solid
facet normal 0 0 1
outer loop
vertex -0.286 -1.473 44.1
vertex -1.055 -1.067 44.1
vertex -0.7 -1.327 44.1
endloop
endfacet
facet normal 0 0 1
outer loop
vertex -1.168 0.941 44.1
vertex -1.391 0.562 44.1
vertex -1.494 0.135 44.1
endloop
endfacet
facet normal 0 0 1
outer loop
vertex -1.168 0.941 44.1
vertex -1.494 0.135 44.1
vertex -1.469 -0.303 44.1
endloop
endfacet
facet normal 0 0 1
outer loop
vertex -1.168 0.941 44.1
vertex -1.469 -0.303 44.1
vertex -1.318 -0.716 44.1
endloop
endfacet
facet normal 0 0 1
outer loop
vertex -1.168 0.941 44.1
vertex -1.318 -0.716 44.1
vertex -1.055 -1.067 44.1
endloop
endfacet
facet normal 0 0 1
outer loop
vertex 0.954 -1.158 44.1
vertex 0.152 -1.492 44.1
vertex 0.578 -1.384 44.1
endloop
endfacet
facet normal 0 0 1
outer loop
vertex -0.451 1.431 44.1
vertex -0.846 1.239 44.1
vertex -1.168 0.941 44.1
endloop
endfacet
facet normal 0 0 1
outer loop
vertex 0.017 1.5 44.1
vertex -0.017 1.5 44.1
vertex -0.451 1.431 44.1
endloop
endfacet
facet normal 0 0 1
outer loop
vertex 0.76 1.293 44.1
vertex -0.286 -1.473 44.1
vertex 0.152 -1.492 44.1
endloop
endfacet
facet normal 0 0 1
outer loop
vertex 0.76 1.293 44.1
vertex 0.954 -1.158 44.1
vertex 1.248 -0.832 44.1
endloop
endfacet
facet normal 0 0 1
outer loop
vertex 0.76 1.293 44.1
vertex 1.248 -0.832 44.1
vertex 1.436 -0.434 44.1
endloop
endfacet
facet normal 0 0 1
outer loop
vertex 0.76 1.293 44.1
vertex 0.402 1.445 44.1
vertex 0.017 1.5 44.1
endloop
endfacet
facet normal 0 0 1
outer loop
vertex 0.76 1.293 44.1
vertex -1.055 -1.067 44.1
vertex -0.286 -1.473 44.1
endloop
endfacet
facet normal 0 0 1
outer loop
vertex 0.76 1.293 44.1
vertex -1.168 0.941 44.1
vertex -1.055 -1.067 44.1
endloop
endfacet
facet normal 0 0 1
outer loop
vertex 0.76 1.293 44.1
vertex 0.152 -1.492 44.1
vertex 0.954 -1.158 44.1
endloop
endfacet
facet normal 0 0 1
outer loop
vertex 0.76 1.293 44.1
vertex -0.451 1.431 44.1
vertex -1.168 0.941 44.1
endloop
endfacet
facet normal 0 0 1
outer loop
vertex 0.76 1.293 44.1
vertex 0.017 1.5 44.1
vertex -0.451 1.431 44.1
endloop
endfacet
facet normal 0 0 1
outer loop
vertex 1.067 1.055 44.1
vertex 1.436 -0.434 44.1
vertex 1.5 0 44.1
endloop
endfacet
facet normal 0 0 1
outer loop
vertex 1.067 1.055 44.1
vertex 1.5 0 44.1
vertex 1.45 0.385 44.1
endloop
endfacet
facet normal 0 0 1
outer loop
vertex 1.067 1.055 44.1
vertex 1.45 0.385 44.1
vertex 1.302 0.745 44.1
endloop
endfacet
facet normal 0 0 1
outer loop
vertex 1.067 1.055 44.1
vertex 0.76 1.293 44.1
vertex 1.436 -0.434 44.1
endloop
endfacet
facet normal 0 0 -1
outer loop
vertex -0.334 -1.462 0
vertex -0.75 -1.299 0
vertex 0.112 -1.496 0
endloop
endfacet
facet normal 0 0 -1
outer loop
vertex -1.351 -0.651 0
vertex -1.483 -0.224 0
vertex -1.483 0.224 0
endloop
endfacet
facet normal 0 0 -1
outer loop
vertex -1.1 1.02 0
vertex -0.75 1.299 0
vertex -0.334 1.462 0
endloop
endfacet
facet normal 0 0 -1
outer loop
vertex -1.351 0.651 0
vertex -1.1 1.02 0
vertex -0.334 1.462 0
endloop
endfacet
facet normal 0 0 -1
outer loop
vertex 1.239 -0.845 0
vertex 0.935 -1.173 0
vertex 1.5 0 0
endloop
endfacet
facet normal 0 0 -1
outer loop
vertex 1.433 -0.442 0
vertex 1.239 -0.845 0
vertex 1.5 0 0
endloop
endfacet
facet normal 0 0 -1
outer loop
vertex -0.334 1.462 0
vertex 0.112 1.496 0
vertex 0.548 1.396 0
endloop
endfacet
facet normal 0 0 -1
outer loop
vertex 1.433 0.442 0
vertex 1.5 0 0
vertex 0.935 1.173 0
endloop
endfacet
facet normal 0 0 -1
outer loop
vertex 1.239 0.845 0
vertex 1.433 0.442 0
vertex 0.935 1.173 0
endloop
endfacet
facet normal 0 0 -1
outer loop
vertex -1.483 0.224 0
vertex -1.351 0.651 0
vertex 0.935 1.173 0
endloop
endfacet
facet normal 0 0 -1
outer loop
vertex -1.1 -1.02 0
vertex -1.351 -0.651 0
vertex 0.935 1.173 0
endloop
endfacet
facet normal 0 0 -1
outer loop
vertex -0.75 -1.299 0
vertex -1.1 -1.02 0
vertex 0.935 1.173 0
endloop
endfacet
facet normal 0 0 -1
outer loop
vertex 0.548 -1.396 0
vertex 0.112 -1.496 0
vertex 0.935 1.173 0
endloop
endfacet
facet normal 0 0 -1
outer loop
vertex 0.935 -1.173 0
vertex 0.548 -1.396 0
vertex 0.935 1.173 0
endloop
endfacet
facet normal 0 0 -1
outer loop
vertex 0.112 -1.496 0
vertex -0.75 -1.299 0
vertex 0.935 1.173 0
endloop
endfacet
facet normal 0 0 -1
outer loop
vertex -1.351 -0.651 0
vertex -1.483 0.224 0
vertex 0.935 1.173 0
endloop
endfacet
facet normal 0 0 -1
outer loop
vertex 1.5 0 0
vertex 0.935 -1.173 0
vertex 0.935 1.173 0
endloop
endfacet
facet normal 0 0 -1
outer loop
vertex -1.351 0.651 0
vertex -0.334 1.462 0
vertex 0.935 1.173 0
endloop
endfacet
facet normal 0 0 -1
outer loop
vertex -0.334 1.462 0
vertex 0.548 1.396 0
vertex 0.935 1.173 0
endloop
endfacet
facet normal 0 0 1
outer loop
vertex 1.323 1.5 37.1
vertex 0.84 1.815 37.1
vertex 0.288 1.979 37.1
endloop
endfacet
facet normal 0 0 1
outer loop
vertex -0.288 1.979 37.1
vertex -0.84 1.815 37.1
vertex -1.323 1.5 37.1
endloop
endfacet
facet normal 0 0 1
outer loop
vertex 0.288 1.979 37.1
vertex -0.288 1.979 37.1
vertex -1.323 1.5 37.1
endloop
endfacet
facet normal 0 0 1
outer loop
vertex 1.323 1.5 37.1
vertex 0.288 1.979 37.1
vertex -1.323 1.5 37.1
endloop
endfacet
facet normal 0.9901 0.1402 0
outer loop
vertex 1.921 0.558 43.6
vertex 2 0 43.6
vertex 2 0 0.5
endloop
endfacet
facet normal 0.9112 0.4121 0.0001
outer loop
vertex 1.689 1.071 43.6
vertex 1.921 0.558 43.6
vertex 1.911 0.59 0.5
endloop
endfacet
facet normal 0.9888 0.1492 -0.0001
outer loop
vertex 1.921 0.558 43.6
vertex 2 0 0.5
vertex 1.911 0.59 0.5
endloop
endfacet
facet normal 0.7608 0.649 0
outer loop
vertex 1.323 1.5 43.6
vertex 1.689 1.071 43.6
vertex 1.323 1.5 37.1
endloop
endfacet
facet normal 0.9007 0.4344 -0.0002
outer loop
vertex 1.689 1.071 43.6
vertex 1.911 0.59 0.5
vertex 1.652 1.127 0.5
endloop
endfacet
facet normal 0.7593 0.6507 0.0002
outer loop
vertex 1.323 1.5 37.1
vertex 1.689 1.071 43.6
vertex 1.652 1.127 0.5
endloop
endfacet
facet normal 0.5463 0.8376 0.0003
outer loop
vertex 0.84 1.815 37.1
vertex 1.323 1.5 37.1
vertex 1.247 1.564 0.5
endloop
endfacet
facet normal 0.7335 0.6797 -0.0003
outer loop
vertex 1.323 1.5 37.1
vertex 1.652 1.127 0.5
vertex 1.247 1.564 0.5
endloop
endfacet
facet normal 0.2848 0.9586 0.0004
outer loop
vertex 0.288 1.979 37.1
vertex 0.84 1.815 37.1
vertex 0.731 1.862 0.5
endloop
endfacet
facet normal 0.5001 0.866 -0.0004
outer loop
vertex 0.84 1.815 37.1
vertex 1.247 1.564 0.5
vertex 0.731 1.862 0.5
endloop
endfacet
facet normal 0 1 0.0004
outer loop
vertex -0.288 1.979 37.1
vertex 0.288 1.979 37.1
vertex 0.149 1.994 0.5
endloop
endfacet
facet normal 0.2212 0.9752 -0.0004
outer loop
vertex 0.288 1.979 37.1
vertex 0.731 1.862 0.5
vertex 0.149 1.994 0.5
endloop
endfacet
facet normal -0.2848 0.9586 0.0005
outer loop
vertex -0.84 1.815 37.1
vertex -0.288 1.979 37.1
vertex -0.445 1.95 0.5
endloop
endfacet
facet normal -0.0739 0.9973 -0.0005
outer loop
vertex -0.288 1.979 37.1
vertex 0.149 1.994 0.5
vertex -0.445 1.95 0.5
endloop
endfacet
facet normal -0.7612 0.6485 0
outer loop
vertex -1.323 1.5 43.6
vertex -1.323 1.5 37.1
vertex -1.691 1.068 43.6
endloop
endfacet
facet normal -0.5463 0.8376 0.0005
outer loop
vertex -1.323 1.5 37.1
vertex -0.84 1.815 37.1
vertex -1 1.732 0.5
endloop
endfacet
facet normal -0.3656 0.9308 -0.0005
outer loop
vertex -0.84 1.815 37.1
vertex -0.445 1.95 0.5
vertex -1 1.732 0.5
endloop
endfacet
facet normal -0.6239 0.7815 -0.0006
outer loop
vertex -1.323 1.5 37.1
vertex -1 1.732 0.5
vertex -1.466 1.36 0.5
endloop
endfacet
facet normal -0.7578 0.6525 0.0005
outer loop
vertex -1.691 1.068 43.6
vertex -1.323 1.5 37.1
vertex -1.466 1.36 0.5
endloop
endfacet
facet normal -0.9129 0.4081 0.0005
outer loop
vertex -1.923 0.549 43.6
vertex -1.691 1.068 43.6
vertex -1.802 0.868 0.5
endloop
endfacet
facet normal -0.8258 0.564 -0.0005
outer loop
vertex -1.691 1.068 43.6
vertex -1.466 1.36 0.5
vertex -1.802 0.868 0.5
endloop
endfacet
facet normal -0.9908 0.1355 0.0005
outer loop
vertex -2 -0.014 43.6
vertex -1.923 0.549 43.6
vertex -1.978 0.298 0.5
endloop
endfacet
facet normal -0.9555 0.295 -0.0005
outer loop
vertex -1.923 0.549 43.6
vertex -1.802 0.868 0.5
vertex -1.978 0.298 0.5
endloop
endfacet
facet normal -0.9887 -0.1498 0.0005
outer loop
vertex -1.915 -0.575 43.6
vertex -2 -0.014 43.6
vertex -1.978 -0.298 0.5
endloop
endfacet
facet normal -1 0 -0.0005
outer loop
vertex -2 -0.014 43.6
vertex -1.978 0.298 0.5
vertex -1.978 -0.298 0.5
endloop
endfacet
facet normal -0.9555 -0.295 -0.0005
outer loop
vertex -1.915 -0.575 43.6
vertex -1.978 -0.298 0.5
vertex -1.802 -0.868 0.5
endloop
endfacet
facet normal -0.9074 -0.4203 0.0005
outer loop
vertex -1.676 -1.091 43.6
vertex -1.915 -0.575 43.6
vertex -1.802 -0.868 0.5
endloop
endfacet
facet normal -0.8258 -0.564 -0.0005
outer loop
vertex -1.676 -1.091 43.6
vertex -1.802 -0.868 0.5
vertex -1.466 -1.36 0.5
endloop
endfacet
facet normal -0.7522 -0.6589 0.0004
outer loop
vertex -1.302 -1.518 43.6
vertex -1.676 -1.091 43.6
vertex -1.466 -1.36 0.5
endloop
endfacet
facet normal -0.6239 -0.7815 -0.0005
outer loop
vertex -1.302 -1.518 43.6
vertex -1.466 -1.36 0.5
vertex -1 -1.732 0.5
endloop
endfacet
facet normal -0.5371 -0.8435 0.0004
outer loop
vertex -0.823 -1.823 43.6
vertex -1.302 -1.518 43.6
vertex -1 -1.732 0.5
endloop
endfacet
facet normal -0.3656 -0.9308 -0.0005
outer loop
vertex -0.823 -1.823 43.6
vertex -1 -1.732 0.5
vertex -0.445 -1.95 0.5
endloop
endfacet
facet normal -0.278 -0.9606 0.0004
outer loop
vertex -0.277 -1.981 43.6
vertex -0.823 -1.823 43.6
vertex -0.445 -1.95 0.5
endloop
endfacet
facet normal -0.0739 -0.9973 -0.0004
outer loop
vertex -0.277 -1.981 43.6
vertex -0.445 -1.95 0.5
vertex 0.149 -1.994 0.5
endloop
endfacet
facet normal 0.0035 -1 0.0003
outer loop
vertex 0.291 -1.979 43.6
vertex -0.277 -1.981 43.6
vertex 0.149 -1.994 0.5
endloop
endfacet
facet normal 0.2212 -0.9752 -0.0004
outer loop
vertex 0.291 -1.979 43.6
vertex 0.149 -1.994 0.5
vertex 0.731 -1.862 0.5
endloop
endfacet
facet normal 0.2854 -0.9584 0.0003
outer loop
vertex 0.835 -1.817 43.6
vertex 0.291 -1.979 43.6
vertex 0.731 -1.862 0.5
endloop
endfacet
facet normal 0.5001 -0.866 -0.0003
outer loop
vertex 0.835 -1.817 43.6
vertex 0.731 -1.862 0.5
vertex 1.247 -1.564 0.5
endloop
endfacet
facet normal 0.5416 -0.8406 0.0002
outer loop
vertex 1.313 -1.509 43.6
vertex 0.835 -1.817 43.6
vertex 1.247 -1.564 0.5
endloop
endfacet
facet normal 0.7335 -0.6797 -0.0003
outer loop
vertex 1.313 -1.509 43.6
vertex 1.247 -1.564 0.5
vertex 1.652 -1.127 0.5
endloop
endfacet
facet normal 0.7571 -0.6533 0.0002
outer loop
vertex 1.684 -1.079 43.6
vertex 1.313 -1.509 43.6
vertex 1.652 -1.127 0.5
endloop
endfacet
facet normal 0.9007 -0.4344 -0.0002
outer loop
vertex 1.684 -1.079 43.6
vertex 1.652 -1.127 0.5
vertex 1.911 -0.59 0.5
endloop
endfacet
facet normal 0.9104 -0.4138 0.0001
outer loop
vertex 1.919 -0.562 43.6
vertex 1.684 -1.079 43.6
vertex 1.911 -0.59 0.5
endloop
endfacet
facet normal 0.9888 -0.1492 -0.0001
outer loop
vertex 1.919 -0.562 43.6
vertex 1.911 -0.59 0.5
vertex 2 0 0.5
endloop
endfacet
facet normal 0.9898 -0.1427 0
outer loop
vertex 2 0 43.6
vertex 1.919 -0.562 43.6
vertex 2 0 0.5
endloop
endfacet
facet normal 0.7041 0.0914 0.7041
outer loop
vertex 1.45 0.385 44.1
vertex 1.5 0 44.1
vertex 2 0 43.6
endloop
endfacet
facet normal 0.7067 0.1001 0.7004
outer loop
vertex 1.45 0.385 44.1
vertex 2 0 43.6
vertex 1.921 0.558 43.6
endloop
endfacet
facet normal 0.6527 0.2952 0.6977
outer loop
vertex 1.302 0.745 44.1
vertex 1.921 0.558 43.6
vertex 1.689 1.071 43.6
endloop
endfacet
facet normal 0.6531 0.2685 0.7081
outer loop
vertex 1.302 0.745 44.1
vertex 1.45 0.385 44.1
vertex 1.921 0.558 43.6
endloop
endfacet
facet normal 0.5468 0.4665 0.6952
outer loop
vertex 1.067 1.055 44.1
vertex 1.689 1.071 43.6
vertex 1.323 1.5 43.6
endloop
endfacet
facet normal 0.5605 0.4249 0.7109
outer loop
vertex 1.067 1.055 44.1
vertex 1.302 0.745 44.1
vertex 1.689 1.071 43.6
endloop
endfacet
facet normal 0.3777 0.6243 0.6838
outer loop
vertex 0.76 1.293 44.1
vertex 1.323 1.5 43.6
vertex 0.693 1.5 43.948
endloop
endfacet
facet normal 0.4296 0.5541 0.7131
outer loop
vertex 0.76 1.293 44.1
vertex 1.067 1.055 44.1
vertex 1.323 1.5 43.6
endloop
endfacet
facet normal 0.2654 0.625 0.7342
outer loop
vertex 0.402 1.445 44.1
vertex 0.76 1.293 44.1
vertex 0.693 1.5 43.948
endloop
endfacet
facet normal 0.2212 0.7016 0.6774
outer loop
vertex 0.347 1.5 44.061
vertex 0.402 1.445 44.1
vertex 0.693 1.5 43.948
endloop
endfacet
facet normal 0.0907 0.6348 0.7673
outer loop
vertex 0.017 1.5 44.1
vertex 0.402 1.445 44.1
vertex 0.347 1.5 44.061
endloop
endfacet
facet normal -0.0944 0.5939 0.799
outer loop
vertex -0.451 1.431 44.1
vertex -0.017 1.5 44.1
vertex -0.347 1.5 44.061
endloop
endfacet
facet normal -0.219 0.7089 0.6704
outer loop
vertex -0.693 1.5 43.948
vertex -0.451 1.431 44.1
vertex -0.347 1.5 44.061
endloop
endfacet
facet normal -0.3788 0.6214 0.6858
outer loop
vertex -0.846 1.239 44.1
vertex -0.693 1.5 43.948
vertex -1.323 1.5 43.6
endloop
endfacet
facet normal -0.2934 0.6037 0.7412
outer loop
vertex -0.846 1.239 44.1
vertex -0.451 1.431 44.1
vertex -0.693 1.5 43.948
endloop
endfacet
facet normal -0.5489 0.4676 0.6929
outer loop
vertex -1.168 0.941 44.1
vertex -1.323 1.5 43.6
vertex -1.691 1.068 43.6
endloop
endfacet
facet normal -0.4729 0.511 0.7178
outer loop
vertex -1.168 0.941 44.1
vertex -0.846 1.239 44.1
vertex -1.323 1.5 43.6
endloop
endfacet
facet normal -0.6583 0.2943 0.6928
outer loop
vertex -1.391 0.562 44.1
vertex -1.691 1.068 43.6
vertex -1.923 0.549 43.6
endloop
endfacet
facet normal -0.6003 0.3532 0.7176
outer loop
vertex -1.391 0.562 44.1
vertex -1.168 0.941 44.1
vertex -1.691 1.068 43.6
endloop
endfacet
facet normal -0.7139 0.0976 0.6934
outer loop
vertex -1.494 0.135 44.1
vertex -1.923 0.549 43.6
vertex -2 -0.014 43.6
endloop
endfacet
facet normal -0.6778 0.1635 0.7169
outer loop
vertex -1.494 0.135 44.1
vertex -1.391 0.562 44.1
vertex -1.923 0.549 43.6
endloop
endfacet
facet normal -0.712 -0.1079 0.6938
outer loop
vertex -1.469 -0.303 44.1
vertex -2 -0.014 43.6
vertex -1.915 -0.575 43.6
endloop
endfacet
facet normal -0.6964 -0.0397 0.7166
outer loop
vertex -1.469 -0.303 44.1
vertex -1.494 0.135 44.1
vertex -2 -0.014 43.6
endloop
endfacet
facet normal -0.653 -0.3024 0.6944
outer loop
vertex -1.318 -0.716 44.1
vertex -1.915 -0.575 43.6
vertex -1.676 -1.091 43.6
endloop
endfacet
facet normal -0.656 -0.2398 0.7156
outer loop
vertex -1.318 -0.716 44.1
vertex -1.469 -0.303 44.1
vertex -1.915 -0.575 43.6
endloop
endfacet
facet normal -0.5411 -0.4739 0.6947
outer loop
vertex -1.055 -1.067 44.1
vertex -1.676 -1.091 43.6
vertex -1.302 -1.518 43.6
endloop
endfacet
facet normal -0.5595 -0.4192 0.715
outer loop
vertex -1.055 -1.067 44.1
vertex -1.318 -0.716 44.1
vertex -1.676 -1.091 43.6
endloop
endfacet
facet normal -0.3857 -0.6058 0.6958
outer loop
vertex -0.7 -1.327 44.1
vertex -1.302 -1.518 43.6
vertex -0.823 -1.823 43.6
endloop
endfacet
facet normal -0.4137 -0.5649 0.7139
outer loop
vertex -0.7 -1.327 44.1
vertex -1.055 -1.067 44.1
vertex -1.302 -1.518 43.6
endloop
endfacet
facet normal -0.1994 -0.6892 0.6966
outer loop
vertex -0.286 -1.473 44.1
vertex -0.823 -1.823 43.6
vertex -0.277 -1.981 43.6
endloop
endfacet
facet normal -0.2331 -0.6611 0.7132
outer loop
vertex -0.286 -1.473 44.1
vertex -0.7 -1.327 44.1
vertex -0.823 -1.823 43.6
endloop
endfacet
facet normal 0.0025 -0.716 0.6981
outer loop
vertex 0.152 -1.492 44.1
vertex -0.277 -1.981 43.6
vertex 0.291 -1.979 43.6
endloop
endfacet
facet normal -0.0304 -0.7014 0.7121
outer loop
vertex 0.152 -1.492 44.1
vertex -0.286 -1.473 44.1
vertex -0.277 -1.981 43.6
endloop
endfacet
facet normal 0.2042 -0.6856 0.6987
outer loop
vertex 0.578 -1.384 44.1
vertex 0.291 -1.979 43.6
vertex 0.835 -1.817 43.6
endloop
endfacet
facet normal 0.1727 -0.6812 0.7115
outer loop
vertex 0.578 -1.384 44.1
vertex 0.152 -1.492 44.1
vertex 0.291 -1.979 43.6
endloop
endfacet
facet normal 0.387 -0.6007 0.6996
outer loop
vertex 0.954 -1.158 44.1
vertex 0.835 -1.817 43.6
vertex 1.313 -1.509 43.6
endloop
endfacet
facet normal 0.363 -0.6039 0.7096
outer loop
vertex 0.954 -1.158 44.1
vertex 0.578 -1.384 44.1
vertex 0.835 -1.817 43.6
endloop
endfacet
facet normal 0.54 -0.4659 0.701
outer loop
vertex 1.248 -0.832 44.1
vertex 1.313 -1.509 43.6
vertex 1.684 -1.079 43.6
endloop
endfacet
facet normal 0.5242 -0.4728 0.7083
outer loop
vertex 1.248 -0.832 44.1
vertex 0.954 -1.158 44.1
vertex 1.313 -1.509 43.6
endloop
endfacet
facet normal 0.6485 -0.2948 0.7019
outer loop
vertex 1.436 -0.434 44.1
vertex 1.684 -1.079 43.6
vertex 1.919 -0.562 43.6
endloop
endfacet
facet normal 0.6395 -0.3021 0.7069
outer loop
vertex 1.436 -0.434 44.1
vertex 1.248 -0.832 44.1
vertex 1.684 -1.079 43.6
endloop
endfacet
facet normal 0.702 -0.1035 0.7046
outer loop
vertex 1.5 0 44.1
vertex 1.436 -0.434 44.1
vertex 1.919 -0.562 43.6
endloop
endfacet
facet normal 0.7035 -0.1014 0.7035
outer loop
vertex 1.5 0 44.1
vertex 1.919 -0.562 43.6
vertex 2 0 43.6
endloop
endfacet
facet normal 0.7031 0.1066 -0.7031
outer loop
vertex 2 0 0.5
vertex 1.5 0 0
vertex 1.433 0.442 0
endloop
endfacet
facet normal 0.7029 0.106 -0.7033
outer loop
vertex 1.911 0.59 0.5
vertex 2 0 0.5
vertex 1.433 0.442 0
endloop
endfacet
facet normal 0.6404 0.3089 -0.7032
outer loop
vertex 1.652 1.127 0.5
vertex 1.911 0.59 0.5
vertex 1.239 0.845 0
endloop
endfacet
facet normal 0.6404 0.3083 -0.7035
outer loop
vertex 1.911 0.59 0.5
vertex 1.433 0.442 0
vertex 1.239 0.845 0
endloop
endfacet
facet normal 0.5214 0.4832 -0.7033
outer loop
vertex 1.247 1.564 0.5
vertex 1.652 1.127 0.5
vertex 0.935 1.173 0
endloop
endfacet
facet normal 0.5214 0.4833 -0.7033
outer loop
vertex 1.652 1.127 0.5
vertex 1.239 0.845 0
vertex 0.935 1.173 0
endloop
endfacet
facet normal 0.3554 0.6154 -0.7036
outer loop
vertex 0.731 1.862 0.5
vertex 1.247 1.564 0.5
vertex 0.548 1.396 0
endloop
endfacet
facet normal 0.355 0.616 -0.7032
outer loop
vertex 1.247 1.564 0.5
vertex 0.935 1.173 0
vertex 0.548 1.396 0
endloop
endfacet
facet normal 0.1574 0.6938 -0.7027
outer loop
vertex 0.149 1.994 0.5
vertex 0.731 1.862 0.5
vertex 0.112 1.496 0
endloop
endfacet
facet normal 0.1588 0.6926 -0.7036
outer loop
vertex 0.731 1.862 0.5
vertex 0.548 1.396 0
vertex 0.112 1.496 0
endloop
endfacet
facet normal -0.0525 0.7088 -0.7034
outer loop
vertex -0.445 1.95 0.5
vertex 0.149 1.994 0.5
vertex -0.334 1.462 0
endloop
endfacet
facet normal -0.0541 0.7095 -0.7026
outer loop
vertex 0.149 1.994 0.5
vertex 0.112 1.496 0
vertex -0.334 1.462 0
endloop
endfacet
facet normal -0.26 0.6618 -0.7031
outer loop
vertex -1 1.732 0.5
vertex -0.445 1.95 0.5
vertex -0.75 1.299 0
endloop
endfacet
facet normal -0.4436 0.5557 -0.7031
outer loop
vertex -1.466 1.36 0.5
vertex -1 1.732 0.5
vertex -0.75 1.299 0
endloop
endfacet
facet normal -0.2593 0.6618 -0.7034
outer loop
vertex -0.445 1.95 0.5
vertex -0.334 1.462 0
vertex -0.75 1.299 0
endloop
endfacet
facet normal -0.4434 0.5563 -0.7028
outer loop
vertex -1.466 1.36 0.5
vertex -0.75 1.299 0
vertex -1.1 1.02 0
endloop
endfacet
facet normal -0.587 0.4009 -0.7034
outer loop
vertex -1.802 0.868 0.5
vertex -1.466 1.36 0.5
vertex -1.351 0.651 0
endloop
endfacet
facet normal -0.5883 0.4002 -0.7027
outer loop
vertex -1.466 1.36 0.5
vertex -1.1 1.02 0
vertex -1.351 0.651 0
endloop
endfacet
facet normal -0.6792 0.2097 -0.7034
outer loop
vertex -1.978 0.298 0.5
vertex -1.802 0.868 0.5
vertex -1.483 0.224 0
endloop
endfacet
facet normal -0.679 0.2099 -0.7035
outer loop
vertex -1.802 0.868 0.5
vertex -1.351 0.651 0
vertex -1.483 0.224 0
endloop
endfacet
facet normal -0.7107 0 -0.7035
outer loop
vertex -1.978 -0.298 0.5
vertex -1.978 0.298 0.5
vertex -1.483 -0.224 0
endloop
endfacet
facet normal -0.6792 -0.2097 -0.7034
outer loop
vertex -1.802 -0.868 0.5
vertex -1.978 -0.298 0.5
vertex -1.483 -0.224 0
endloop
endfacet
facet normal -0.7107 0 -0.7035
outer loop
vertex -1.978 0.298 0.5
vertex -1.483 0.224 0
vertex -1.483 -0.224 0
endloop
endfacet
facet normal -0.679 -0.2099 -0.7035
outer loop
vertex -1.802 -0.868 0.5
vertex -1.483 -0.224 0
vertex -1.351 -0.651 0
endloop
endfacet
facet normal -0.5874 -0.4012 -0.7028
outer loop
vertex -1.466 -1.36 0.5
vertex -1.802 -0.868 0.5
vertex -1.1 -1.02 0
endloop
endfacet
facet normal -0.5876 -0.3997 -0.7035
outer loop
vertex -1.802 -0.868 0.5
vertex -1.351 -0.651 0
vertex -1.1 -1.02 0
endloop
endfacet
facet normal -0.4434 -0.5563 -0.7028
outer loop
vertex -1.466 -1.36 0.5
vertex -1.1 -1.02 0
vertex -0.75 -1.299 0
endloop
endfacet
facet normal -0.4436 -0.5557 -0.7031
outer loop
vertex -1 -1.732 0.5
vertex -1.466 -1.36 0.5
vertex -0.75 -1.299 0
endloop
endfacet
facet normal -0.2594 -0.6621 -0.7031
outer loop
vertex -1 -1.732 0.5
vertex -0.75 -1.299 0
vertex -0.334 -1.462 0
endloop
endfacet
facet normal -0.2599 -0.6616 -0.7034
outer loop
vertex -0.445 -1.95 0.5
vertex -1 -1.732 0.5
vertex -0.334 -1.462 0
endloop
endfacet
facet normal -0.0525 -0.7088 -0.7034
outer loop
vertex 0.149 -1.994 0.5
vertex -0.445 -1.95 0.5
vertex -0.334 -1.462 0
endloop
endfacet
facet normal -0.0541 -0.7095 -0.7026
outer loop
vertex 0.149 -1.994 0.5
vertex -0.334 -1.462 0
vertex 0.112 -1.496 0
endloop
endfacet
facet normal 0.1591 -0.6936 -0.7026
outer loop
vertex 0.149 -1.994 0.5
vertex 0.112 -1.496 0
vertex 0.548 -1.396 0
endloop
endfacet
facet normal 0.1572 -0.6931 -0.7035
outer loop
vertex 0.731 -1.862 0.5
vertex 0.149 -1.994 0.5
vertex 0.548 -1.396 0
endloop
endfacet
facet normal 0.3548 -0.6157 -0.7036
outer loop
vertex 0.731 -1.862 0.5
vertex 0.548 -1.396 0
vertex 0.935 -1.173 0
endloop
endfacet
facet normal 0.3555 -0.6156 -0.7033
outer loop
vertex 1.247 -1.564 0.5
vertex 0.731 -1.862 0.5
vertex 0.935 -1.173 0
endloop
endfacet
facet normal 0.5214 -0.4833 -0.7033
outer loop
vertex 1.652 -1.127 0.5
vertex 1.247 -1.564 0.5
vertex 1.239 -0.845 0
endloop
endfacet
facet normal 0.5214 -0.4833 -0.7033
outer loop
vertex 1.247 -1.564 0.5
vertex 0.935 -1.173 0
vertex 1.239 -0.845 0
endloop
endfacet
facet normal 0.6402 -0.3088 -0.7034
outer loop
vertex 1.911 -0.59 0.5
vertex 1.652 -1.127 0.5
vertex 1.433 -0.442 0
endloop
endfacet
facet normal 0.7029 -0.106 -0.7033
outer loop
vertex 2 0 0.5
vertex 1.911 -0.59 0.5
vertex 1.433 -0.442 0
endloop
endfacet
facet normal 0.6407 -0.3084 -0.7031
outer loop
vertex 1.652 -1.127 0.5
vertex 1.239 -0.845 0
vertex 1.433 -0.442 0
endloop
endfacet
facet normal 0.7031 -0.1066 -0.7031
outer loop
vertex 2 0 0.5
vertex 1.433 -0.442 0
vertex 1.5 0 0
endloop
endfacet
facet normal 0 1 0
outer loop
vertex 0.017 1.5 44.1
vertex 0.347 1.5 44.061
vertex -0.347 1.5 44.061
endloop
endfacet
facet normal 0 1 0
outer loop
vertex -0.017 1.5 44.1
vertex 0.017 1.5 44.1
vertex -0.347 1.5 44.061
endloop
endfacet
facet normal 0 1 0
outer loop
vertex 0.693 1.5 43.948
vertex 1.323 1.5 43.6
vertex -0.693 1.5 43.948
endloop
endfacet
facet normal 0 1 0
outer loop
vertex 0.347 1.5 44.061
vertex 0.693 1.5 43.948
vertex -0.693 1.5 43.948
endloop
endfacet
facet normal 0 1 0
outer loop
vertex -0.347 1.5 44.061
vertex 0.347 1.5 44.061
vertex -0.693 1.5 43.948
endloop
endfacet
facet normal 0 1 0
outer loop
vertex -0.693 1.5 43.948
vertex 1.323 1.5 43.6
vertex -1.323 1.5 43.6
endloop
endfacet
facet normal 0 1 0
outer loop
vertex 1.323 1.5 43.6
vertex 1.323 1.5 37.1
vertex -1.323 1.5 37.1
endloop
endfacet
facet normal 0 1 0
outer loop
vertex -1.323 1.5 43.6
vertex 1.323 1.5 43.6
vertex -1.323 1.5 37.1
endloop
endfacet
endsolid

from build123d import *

# Parameters (mm, degrees)
SKETCH_2_R          = 2
EXTRUDE_1_DEPTH     = 44.1
CUT_EXTRUDE_START   = -7
CUT_EXTRUDE_1_DEPTH = 7
CHAMFER_1_SIZE      = 0.5
CHAMFER_2_SIZE      = 0.5


with BuildPart() as part:
    # Эскиз2 → Бобышка-Вытянуть1 (new body)
    with BuildSketch(Plane.XY):
        Circle(SKETCH_2_R)
    extrude(amount=EXTRUDE_1_DEPTH)

    # Эскиз3 → Вырез-Вытянуть1 (cut)
    with BuildSketch(Plane.XY.offset(44.1).offset(CUT_EXTRUDE_START)):
        with BuildLine():
            Line((1.322875656, 1.5), (-1.322875656, 1.5))
            ThreePointArc((-1.322875656, 1.5), (0, 2), (1.322875656, 1.5))
        make_face()
    extrude(amount=CUT_EXTRUDE_1_DEPTH, mode=Mode.SUBTRACT)

    # Фаска1
    chamfer_1_edges = [part.edges().sort_by_distance(p)[0] for p in [
        (-2, 0, 0),
    ]]
    chamfer(chamfer_1_edges, length=CHAMFER_1_SIZE)

    # Фаска2
    chamfer_2_edges = [part.edges().sort_by_distance(p)[0] for p in [
        (-0.822875656, -1.822875656, 44.1),
    ]]
    chamfer(chamfer_2_edges, length=CHAMFER_2_SIZE - 0.0001)  # a hair under: the kernel refuses the full size


solid = part.part
